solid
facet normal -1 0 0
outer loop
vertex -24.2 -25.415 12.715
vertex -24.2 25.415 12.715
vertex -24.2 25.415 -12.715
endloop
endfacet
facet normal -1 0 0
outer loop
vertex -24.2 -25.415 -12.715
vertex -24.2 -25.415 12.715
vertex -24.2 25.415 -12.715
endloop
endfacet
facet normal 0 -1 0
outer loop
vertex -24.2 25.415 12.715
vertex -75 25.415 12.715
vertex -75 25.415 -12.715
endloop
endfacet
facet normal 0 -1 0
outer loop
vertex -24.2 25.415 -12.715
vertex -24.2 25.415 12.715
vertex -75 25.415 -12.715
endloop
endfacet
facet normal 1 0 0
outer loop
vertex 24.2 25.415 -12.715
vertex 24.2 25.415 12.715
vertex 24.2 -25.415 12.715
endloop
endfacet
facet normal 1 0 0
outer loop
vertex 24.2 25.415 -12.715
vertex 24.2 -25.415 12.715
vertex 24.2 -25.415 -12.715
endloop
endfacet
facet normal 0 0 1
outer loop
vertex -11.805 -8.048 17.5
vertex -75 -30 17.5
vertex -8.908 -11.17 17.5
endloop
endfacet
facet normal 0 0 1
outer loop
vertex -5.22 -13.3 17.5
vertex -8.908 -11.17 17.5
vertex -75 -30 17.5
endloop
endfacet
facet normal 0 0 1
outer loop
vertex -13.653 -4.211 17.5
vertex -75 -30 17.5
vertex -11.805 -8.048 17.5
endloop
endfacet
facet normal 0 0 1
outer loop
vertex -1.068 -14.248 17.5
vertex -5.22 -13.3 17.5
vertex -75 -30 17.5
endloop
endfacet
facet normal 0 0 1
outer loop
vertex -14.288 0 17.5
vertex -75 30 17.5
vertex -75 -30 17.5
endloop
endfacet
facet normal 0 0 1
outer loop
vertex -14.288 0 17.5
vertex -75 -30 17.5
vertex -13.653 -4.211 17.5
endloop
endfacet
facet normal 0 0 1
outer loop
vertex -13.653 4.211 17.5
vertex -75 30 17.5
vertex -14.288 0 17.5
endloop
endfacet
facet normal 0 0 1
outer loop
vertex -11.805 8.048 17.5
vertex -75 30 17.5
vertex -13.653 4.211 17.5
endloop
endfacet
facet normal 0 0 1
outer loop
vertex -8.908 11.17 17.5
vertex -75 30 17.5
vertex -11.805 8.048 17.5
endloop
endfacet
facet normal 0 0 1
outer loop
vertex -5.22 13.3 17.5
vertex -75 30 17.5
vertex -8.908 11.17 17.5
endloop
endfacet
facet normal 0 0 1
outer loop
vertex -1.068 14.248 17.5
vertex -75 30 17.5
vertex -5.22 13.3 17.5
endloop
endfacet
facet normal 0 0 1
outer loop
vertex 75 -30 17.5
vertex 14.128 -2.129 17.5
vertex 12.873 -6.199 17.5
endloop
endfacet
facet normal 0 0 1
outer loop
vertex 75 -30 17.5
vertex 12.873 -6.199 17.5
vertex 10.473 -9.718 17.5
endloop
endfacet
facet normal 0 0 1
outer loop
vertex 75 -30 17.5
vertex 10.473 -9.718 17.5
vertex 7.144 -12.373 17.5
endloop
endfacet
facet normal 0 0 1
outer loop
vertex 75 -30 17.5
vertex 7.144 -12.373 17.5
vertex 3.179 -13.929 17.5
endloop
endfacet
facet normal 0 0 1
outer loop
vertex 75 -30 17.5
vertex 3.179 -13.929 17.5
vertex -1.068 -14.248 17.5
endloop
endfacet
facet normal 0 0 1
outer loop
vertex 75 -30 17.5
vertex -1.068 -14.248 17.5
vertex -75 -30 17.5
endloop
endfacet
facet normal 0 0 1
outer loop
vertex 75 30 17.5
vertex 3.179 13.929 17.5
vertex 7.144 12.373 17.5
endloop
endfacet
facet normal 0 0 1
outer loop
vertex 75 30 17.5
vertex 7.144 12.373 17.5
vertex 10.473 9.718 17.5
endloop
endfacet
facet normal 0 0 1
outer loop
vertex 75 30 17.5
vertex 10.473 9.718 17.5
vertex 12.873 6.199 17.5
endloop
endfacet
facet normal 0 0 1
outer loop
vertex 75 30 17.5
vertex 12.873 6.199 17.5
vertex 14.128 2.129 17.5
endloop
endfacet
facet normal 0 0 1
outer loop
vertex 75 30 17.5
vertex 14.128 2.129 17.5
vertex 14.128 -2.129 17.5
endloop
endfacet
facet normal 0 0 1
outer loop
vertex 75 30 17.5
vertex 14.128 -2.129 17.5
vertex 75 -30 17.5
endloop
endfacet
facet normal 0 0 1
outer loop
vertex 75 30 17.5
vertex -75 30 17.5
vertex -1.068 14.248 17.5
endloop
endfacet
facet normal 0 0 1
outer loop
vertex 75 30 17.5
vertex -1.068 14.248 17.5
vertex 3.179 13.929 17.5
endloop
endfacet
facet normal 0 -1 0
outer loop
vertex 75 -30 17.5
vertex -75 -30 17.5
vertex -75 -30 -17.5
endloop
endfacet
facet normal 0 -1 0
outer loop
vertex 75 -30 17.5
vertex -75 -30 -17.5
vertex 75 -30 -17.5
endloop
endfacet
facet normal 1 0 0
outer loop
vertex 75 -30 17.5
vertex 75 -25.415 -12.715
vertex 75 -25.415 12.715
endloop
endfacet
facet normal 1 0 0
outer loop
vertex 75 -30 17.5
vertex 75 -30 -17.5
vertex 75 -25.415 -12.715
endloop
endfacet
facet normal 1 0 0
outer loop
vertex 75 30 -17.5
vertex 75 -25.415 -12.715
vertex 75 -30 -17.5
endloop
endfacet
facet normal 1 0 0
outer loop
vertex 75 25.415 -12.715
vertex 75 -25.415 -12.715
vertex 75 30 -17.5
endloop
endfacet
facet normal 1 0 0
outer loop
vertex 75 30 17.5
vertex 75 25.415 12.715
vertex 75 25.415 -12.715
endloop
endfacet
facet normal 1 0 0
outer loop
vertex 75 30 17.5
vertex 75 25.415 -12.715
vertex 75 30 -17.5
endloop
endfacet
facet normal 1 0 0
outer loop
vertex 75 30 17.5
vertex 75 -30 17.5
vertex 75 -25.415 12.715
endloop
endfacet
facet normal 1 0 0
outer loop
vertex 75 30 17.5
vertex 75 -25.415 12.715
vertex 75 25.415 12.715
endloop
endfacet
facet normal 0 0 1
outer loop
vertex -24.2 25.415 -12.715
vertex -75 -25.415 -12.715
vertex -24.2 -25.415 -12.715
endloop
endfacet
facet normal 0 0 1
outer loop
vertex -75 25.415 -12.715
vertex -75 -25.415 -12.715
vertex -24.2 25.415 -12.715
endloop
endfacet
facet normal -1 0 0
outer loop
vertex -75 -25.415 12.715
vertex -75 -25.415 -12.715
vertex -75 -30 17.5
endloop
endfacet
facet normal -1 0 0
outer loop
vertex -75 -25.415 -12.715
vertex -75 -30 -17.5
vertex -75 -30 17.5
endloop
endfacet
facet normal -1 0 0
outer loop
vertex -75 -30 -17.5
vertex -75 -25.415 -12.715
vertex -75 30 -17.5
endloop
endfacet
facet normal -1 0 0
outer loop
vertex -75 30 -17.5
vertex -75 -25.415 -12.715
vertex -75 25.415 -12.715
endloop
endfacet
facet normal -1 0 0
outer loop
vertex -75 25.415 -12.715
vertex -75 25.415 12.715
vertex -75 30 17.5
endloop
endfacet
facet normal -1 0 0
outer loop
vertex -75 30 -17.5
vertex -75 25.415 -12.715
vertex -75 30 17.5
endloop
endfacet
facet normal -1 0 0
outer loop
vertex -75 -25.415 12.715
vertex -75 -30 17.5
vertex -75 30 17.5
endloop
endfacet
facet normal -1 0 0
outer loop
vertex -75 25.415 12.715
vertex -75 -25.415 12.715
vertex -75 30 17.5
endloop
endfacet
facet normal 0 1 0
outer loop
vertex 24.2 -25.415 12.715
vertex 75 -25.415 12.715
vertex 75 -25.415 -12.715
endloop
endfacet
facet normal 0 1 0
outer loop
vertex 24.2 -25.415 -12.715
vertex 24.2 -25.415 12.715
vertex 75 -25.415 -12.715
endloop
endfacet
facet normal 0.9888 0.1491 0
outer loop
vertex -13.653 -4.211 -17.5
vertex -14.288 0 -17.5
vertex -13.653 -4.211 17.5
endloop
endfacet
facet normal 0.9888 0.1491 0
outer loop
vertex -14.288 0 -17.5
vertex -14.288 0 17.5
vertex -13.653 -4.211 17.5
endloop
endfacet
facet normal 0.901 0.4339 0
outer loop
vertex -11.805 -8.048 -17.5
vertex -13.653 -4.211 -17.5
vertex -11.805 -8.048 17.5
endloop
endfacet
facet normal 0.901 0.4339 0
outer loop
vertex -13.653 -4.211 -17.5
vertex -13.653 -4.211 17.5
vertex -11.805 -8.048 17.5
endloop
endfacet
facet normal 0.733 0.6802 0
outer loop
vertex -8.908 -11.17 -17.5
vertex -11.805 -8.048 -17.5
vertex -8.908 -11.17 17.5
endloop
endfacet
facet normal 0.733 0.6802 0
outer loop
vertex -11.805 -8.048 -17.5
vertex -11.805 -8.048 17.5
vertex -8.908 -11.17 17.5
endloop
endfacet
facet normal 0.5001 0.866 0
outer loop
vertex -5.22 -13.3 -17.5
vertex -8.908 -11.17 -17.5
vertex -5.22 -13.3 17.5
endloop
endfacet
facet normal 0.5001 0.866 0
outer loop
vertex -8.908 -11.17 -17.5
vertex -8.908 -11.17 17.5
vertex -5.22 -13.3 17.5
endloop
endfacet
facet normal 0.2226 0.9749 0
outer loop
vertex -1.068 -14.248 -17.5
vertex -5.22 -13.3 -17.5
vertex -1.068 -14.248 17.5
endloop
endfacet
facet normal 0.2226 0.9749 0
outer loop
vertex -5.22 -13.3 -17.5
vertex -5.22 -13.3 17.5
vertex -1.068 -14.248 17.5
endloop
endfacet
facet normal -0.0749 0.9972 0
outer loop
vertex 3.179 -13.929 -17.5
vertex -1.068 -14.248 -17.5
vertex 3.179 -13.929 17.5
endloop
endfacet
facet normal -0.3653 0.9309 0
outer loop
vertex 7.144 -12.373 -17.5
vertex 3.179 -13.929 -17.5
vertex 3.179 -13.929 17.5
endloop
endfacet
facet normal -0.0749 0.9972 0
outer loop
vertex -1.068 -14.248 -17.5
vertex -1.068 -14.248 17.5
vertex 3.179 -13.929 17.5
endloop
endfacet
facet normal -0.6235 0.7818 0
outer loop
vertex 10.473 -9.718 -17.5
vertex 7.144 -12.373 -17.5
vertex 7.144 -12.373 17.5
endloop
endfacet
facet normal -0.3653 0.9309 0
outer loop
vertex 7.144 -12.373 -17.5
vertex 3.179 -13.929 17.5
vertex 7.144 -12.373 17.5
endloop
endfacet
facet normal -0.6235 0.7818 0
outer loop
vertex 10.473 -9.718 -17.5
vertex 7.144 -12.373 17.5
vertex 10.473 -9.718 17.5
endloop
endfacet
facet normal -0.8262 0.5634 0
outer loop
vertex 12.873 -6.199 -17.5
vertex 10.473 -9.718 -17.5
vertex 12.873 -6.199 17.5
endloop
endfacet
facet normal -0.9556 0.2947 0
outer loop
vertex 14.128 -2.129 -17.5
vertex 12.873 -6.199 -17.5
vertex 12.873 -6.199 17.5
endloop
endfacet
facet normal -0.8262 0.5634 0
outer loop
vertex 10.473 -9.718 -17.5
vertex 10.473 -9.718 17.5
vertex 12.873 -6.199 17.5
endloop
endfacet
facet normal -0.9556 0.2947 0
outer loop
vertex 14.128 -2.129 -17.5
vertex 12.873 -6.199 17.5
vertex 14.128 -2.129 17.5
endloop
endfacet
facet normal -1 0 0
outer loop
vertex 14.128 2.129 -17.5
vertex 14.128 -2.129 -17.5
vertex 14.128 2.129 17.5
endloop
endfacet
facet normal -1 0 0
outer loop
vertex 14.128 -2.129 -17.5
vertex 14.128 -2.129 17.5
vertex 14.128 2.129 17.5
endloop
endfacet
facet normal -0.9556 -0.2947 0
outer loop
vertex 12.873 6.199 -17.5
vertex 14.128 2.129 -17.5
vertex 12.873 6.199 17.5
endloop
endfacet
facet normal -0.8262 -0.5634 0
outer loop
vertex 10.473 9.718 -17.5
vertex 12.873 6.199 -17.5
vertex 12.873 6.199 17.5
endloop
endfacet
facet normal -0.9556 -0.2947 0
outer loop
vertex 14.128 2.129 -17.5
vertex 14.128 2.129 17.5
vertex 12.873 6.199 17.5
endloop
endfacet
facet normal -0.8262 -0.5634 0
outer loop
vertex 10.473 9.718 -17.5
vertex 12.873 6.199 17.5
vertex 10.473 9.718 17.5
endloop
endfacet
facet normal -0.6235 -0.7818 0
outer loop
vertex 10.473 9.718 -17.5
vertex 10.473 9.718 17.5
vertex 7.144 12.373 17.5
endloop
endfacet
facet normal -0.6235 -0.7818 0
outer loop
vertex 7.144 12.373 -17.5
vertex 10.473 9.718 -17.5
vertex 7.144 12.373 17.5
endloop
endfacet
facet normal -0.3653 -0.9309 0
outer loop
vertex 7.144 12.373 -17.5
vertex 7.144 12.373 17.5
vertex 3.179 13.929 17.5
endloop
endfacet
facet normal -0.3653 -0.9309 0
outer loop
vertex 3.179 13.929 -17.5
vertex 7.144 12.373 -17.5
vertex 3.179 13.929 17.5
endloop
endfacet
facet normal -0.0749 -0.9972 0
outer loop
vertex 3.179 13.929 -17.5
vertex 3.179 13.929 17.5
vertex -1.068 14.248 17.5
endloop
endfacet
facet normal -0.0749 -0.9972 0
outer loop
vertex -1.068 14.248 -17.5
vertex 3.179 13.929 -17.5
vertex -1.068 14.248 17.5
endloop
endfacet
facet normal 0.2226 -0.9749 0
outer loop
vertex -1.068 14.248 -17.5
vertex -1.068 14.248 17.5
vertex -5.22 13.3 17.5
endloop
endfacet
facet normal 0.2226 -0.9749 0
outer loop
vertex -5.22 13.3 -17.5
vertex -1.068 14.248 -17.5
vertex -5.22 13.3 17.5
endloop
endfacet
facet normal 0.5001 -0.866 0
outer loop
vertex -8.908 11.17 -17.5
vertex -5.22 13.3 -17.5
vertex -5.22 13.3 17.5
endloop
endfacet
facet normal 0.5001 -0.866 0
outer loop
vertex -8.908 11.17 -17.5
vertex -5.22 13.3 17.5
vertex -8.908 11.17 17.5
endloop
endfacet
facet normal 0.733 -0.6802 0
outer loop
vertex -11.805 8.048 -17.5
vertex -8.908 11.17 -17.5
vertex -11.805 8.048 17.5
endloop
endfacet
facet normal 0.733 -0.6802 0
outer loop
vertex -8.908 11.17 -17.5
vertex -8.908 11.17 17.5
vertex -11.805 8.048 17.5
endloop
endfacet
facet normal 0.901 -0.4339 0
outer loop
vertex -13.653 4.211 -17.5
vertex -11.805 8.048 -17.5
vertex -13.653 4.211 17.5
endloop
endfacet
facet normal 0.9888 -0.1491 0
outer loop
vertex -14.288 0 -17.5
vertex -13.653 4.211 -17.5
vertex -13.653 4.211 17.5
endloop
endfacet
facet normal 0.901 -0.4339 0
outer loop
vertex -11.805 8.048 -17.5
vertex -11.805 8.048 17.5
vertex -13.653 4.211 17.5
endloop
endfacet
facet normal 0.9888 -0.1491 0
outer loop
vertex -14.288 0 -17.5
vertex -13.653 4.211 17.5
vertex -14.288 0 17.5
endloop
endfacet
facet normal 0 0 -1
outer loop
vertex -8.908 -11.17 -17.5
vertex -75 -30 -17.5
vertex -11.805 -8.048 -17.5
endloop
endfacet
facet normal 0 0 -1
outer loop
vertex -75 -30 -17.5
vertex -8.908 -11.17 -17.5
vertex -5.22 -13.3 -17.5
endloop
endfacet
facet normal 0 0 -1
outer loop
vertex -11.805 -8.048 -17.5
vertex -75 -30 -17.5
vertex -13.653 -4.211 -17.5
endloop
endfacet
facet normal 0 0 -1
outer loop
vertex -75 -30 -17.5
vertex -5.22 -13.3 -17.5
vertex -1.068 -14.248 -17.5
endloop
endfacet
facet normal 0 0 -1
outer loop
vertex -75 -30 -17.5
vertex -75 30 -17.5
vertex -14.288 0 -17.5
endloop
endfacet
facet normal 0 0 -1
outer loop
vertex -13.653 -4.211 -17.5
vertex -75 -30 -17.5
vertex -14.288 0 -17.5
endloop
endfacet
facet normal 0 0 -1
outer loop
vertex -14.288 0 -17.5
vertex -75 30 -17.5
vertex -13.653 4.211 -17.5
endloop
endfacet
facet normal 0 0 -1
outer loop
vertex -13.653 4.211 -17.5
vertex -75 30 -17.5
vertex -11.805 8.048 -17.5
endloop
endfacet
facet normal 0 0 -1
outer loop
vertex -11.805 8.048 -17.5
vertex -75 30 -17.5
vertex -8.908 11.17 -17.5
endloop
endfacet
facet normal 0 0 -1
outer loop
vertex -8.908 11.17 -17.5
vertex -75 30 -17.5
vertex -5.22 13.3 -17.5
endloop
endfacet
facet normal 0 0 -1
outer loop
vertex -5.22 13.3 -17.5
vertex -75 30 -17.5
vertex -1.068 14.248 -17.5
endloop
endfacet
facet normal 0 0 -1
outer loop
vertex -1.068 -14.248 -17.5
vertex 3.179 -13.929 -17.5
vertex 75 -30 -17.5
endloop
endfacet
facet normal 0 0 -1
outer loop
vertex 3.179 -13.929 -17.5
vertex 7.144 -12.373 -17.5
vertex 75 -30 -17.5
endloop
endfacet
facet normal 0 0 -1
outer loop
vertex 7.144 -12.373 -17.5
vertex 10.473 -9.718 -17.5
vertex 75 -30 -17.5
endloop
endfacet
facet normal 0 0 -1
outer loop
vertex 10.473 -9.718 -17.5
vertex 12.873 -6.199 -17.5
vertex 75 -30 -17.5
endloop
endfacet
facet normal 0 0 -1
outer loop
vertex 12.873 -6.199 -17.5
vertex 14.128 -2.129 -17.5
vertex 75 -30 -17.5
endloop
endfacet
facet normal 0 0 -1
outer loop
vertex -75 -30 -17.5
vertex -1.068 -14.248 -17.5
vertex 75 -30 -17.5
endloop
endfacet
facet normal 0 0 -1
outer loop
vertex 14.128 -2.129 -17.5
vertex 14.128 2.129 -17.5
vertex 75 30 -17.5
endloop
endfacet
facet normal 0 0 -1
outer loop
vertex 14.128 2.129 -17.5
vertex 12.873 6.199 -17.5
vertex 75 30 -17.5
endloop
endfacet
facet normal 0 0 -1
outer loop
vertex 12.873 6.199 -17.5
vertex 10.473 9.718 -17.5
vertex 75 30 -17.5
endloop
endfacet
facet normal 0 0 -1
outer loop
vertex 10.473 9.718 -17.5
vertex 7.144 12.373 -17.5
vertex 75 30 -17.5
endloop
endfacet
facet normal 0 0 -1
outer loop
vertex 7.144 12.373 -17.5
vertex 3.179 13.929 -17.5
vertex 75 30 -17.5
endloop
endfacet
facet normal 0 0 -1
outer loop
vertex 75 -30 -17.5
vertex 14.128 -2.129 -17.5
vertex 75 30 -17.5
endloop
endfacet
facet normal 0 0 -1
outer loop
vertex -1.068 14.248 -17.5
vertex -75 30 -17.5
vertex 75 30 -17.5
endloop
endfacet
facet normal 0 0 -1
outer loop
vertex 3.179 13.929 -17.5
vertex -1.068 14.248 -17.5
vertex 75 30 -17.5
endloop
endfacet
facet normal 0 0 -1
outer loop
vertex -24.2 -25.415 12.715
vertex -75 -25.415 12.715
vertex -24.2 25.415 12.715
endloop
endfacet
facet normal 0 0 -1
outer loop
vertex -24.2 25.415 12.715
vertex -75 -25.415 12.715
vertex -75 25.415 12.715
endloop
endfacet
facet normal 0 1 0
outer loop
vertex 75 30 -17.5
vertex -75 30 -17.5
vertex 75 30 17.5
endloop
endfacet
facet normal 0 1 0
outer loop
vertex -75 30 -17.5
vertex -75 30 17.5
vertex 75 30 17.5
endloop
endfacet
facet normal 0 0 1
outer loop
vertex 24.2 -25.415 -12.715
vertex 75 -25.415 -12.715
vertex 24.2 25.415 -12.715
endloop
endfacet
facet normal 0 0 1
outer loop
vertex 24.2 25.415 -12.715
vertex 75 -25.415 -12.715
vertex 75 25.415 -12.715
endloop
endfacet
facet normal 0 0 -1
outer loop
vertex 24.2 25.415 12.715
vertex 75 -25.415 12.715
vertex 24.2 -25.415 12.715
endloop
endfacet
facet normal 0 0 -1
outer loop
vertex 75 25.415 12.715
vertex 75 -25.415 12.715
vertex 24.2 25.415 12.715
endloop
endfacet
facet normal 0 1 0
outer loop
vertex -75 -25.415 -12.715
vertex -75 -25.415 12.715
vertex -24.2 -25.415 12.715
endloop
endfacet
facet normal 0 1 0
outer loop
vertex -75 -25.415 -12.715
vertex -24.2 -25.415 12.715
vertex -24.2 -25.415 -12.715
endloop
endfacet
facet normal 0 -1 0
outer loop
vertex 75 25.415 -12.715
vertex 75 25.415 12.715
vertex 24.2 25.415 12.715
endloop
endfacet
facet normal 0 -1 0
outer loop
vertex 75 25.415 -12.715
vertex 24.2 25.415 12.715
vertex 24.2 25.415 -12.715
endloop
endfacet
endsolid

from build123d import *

# Parameters (mm, degrees)
SKETCH1_W                      = 150
SKETCH1_H                      = 60
BOSS_EXTRUDE1_DEPTH            = 17.5
SKETCH2_W                      = 25.43
SKETCH2_H                      = 50.83
CUT_EXTRUDE1_DEPTH             = 50.8
CUT_EXTRUDE2_REACH             = 84.651
SKETCH3_R                      = 14.2875
CUT_EXTRUDE2_DIRECTION_2_REACH = 84.651


with BuildPart() as part:
    # Sketch1 → Boss-Extrude1 (new, symmetric)
    with BuildSketch(Plane.XY):
        Rectangle(SKETCH1_W, SKETCH1_H)
    extrude(amount=BOSS_EXTRUDE1_DEPTH, both=True)

    # Sketch2 → Cut-Extrude1 (cut)
    with BuildSketch(Plane(origin=(75, 0, 0), x_dir=(0, 0, -1), z_dir=(1, 0, 0))):
        Rectangle(SKETCH2_W, SKETCH2_H)
    cut_extrude1 = extrude(amount=-CUT_EXTRUDE1_DEPTH, mode=Mode.SUBTRACT)

    # Cut-Extrude2: up to this face of the body (flat: up to its plane)
    cut_extrude2_end = Plane(part.part.faces().sort_by_distance((0, 0, 17.5))[0])
    # Sketch3 → Cut-Extrude2 (cut, up to the picked face)
    with BuildSketch(Plane.XY, mode=Mode.PRIVATE) as cut_extrude2_sk1:
        with Locations(Location((0, 0, 0), (0, 0, 180))):
            Circle(SKETCH3_R)
    cut_extrude2_tool1 = split(extrude(cut_extrude2_sk1.sketch, amount=CUT_EXTRUDE2_REACH, mode=Mode.PRIVATE), bisect_by=cut_extrude2_end, keep=Keep.BOTH, mode=Mode.PRIVATE)
    add(cut_extrude2_tool1.solids().sort_by(Axis((0, 0, 0), (0, 0, 1)))[0], mode=Mode.SUBTRACT)

    # Cut-Extrude2 direction 2: up to this face of the body (flat: up to its plane)
    cut_extrude2_direction_2_end = Plane(part.part.faces().sort_by_distance((0, 0, -17.5))[0])
    # Sketch3 → Cut-Extrude2 direction 2 (cut, up to the picked face)
    with BuildSketch(Plane.XY, mode=Mode.PRIVATE) as cut_extrude2_direction_2_sk1:
        with Locations(Location((0, 0, 0), (0, 0, 180))):
            Circle(SKETCH3_R)
    cut_extrude2_direction_2_tool1 = split(extrude(cut_extrude2_direction_2_sk1.sketch, amount=-CUT_EXTRUDE2_DIRECTION_2_REACH, mode=Mode.PRIVATE), bisect_by=cut_extrude2_direction_2_end, keep=Keep.BOTH, mode=Mode.PRIVATE)
    add(cut_extrude2_direction_2_tool1.solids().sort_by(Axis((0, 0, 0), (0, 0, -1)))[0], mode=Mode.SUBTRACT)

    # Mirror1: Cut-Extrude1 across plane
    add(cut_extrude1.mirror(Plane(origin=(0, 0, 0), x_dir=(0, 0, 1), z_dir=(1, 0, 0))), mode=Mode.SUBTRACT)


solid = part.part
